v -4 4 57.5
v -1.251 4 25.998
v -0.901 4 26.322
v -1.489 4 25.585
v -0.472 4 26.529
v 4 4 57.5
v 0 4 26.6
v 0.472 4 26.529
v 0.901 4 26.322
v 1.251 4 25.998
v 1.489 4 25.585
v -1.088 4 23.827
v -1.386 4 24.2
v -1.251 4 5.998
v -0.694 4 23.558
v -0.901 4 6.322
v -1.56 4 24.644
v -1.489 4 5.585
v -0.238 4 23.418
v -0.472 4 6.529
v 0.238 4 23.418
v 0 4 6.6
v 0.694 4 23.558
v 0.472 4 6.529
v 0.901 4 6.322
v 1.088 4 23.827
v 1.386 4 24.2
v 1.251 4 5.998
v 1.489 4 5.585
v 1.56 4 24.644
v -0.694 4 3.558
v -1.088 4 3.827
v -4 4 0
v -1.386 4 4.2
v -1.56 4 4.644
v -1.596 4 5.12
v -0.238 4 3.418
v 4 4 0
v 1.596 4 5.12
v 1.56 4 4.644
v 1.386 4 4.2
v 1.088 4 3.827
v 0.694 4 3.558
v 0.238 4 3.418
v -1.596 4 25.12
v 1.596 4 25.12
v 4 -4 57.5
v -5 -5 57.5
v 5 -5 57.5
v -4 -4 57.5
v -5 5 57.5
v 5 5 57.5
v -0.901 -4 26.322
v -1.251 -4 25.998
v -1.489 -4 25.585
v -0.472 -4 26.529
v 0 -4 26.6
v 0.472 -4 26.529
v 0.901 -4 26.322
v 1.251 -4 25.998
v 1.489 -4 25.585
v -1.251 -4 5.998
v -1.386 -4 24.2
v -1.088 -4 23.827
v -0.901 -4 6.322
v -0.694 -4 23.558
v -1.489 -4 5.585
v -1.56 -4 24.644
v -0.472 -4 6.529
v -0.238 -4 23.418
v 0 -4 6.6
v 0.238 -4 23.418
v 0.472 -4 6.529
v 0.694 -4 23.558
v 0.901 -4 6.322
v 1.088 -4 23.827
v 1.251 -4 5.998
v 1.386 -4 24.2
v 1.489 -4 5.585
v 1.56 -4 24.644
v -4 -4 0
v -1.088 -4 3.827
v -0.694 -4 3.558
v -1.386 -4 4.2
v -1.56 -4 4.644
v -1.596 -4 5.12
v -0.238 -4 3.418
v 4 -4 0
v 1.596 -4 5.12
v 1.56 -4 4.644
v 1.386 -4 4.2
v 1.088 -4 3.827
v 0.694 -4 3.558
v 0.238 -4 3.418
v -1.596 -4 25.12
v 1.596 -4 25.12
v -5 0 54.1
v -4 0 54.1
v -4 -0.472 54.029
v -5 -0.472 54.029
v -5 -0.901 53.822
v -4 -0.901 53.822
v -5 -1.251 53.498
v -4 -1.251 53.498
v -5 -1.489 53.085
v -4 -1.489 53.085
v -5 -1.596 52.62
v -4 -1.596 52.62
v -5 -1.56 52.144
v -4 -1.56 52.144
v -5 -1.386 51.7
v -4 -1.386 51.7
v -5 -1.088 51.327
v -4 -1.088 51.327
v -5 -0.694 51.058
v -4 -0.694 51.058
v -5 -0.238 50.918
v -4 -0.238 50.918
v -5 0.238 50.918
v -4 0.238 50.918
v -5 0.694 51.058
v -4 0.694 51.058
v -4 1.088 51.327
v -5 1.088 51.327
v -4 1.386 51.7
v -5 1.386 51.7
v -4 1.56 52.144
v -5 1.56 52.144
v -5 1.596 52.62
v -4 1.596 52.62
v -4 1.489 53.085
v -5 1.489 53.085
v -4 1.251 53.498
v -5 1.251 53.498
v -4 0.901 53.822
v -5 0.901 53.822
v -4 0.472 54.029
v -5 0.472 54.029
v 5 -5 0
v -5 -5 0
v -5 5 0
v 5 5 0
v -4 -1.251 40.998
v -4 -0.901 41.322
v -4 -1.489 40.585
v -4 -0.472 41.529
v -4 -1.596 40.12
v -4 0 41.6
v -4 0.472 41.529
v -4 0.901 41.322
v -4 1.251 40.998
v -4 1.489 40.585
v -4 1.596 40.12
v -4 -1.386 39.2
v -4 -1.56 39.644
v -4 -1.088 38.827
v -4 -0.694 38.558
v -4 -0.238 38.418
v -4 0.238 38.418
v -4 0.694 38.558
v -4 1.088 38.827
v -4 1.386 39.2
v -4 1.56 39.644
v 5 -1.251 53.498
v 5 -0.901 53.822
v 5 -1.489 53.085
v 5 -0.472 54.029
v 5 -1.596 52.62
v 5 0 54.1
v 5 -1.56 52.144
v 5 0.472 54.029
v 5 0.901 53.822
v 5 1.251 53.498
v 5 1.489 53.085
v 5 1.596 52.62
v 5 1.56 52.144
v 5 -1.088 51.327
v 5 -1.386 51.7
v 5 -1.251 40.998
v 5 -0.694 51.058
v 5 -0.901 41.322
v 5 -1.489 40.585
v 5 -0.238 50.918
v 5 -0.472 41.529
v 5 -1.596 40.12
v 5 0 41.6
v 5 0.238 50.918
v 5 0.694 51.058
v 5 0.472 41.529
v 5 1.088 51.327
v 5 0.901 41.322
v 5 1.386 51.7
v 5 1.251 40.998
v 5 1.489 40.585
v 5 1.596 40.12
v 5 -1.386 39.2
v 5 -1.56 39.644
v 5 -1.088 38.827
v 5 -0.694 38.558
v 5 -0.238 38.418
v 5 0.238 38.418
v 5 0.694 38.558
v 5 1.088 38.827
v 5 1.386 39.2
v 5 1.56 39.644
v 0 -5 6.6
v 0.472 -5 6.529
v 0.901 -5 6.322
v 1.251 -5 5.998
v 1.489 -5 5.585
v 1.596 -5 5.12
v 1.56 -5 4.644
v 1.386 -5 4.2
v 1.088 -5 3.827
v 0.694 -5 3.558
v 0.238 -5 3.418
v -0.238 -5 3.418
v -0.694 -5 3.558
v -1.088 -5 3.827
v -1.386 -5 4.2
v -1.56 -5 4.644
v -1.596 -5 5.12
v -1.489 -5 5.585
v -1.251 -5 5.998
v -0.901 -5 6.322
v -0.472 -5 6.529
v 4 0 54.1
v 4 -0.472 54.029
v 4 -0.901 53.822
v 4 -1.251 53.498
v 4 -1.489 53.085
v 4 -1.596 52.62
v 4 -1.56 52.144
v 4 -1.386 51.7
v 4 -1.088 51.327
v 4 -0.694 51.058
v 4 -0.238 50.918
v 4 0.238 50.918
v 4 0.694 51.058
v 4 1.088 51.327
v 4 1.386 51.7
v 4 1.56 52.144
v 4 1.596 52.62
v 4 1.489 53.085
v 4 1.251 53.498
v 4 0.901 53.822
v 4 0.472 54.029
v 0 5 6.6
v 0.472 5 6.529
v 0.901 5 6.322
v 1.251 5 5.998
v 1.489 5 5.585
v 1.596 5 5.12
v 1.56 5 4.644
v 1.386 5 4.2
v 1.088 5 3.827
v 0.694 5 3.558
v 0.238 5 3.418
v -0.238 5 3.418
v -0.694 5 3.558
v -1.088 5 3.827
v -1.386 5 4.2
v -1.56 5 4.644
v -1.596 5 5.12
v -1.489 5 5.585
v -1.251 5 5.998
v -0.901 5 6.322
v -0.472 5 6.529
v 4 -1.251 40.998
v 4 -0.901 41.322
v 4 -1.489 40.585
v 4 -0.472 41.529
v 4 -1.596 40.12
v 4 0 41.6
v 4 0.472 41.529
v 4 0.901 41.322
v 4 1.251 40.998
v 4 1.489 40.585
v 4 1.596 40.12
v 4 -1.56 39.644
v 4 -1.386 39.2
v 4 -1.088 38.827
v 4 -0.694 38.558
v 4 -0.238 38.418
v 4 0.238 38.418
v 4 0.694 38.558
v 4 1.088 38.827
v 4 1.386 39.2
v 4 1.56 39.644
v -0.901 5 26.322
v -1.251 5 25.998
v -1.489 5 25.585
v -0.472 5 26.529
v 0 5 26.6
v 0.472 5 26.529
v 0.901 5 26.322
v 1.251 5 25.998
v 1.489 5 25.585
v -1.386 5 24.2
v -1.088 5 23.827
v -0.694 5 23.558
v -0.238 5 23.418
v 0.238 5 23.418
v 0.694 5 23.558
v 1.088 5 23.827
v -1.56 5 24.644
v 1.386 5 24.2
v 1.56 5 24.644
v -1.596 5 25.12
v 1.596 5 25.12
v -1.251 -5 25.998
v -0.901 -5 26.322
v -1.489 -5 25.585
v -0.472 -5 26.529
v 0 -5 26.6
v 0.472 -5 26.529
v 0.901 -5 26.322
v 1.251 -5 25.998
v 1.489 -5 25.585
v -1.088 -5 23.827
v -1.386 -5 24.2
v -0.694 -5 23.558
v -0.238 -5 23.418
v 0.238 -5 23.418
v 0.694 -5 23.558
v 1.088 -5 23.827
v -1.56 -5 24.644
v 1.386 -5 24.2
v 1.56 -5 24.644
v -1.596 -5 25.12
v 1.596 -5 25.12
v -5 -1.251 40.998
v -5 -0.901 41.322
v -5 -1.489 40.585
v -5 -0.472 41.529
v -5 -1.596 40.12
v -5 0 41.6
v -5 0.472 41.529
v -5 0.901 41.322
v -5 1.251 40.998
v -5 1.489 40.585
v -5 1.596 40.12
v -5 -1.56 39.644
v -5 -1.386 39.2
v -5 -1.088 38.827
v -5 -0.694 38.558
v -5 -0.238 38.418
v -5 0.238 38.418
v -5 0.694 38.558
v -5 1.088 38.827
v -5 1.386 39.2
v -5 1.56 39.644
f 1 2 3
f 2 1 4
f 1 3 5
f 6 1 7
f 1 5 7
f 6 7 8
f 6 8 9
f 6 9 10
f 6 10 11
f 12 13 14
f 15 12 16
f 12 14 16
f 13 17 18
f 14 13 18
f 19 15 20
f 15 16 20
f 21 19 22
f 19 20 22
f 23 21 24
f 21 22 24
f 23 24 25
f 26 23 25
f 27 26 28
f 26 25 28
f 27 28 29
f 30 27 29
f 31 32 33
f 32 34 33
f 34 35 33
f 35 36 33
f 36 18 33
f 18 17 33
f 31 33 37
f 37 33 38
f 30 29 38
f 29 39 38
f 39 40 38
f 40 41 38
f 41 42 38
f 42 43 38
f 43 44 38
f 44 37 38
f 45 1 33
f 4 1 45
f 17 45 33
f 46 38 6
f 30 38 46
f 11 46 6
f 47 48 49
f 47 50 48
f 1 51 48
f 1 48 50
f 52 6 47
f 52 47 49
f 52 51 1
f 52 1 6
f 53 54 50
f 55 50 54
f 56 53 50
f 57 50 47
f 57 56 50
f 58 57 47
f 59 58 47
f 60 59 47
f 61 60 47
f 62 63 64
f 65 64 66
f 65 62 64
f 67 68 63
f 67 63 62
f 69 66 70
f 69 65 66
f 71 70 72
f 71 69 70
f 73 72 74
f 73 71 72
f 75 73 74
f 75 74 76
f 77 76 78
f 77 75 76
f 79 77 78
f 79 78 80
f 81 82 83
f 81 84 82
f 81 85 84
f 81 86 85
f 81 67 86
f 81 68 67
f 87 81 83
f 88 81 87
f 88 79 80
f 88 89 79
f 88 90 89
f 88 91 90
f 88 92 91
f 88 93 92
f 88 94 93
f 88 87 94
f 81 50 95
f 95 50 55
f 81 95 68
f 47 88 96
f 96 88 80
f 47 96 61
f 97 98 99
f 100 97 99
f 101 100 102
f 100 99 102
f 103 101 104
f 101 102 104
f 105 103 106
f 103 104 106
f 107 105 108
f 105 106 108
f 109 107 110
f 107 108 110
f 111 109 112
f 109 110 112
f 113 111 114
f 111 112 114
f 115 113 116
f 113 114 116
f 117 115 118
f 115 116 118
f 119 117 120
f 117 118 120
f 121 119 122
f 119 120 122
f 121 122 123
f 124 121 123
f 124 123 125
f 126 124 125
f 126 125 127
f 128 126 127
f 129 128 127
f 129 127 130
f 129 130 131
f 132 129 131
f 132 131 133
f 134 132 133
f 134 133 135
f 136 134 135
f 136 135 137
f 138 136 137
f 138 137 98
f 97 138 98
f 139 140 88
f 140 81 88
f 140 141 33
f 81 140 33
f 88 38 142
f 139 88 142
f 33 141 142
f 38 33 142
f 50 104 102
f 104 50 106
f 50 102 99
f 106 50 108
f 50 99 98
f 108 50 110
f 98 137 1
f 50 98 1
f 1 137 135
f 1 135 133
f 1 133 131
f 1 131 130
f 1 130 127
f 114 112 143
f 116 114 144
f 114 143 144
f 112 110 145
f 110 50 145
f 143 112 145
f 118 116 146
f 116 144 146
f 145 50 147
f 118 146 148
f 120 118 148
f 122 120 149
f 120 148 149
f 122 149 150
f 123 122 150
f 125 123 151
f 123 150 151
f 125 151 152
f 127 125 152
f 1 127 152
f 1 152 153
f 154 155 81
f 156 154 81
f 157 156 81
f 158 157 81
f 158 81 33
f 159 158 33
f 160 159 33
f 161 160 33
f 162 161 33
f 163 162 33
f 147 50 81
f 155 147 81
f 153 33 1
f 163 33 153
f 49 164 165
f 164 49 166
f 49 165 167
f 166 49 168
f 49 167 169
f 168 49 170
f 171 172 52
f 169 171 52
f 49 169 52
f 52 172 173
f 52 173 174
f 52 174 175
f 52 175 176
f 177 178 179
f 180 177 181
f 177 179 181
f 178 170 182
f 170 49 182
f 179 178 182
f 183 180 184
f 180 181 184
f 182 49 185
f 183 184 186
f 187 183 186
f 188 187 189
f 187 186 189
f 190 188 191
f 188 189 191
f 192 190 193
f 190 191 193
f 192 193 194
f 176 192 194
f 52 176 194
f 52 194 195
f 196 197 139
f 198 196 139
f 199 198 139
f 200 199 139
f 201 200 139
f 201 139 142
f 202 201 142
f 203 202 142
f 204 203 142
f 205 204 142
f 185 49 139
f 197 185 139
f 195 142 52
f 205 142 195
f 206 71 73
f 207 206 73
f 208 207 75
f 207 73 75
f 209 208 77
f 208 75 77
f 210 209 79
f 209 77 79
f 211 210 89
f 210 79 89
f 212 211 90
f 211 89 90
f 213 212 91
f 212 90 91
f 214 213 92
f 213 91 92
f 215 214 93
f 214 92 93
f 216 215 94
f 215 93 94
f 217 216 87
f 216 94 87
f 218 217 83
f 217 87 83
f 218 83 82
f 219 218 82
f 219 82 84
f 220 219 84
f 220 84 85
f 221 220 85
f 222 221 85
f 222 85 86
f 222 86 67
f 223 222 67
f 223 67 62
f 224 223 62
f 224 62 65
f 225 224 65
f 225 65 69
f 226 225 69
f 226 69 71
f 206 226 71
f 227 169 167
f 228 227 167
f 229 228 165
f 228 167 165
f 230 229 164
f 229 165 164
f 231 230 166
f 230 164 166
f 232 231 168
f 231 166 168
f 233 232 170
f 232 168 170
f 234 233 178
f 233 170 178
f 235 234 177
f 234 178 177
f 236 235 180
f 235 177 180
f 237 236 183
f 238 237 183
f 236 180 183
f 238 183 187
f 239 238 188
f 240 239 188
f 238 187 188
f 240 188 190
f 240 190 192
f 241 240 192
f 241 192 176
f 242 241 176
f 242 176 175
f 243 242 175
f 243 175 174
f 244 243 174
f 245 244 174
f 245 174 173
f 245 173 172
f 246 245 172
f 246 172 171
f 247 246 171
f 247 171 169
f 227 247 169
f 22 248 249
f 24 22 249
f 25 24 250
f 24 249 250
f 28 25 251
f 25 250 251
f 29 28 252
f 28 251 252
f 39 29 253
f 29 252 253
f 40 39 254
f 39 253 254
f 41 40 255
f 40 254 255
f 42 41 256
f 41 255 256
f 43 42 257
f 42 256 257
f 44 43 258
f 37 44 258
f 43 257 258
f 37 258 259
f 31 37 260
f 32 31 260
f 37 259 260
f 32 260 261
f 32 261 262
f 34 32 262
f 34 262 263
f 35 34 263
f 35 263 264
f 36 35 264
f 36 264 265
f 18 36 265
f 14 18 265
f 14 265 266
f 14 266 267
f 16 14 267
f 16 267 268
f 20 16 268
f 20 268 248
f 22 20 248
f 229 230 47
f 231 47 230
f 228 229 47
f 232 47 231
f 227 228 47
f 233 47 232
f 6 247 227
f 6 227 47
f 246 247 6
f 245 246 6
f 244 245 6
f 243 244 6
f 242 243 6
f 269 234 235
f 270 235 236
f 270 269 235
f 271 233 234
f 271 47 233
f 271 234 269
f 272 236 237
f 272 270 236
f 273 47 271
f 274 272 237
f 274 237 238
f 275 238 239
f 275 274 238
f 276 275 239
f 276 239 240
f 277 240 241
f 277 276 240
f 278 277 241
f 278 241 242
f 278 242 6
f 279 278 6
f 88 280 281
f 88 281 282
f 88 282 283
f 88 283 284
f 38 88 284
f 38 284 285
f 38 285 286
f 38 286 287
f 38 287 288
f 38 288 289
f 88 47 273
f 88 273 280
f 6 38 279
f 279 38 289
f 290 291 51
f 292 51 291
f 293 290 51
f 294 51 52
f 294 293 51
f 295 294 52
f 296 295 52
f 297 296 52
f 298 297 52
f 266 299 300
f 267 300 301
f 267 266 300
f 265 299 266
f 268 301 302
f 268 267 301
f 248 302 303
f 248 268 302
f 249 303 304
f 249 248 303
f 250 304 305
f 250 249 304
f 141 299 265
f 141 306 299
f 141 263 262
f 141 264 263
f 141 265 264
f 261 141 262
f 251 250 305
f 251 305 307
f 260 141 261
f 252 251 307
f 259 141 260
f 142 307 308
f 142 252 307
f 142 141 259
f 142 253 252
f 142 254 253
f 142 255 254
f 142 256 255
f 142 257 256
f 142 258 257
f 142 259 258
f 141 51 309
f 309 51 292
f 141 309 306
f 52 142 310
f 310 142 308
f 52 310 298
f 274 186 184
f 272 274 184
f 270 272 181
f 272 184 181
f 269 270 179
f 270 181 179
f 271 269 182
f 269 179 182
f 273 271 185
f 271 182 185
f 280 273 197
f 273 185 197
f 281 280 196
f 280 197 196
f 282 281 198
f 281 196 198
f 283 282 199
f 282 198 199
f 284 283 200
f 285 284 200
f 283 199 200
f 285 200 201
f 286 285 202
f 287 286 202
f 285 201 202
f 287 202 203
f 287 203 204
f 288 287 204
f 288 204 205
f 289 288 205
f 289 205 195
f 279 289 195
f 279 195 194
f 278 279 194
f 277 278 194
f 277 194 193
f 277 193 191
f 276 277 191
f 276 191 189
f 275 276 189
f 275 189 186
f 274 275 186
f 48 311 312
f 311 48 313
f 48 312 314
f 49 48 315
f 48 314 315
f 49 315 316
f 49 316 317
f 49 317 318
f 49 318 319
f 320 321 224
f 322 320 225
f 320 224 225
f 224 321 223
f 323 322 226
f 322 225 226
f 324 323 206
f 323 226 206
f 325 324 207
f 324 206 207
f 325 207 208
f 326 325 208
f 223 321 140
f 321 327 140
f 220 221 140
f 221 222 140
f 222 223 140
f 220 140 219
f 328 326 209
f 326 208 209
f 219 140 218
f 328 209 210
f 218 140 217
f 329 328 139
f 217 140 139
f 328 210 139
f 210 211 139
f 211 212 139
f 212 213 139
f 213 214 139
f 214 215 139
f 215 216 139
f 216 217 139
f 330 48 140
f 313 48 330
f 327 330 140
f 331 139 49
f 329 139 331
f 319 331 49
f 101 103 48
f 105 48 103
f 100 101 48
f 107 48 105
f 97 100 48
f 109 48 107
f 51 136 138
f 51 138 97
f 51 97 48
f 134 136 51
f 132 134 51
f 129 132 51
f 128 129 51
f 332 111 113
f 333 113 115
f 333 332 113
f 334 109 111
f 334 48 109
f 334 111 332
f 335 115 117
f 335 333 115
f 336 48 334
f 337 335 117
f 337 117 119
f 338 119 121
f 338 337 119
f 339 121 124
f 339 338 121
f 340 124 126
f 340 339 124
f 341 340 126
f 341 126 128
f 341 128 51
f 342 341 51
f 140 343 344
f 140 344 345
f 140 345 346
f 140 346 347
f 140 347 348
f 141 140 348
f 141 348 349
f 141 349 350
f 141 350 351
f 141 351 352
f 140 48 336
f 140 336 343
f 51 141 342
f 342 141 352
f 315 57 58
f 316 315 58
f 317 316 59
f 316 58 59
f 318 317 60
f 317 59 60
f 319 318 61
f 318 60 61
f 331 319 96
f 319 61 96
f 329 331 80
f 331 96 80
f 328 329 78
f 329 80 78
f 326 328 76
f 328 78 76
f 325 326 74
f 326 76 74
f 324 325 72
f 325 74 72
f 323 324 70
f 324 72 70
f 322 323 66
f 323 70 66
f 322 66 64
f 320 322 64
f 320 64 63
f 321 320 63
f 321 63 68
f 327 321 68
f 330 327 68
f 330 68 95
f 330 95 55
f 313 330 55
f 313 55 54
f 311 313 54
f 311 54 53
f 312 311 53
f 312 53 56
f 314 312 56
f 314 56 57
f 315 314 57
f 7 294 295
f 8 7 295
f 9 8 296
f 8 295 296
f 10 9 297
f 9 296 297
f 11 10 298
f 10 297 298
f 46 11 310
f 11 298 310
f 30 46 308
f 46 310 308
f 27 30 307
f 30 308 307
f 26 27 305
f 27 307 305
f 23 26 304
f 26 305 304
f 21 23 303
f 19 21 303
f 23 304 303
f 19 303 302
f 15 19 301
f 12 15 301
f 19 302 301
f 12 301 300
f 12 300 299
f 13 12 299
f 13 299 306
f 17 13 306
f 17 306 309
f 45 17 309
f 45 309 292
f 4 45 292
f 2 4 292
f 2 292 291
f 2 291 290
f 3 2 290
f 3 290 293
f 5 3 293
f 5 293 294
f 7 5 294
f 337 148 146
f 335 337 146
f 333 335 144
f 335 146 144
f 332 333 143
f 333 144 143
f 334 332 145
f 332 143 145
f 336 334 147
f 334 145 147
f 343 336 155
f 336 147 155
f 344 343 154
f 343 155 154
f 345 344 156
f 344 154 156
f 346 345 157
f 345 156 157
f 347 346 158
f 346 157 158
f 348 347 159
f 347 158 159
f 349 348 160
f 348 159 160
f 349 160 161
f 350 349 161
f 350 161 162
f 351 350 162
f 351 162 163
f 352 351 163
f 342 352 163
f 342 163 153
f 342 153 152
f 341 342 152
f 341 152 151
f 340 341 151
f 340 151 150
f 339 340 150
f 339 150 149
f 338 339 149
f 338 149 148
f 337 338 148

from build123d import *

# Parameters (mm, degrees)
SKETCH_1_W          = 10
SKETCH_1_H          = 10
SKETCH_1_W_2        = 8
SKETCH_1_H_2        = 8
EXTRUDE_1_DEPTH     = 57.5
SKETCH_2_R          = 1.6
CUT_EXTRUDE_1_DEPTH = 59.576872569
CUT_EXTRUDE_2_DEPTH = 10


with BuildPart() as part:
    # ｽｹｯﾁ1 → 押し出し-薄板1 (new body)
    with BuildSketch(Plane.XY):
        Rectangle(SKETCH_1_W, SKETCH_1_H)
        Rectangle(SKETCH_1_W_2, SKETCH_1_H_2, mode=Mode.SUBTRACT)
    extrude(amount=EXTRUDE_1_DEPTH)

    # ｽｹｯﾁ2 → ｶｯﾄ - 押し出し1 (cut, through all)
    with BuildSketch(Plane(origin=(0, 5, 0), x_dir=(1, 0, 0), z_dir=(0, 1, 0))):
        with Locations(Location((0, -5, 0), (0, 0, 270))):
            Circle(SKETCH_2_R)
        with Locations(Location((0, -25, 0), (0, 0, 270))):
            Circle(SKETCH_2_R)
    extrude(amount=-CUT_EXTRUDE_1_DEPTH, mode=Mode.SUBTRACT)

    # ｽｹｯﾁ4 → ｶｯﾄ - 押し出し2 (cut)
    with BuildSketch(Plane(origin=(5, 0, 0), x_dir=(0, 0, -1), z_dir=(1, 0, 0))):
        with BuildLine():
            ThreePointArc((-38.4, 0), (-40, 1.6), (-41.6, 0))
            Line((-41.6, 0), (-38.4, 0))
        make_face()
        with BuildLine():
            Line((-38.4, 0), (-41.6, 0))
            ThreePointArc((-41.6, 0), (-40, -1.6), (-38.4, 0))
        make_face()
        with BuildLine():
            ThreePointArc((-50.9, 0), (-52.5, 1.6), (-54.1, 0))
            Line((-54.1, 0), (-50.9, 0))
        make_face()
        with BuildLine():
            Line((-50.9, 0), (-54.1, 0))
            ThreePointArc((-54.1, 0), (-52.5, -1.6), (-50.9, 0))
        make_face()
    extrude(amount=-CUT_EXTRUDE_2_DEPTH, mode=Mode.SUBTRACT)


solid = part.part
